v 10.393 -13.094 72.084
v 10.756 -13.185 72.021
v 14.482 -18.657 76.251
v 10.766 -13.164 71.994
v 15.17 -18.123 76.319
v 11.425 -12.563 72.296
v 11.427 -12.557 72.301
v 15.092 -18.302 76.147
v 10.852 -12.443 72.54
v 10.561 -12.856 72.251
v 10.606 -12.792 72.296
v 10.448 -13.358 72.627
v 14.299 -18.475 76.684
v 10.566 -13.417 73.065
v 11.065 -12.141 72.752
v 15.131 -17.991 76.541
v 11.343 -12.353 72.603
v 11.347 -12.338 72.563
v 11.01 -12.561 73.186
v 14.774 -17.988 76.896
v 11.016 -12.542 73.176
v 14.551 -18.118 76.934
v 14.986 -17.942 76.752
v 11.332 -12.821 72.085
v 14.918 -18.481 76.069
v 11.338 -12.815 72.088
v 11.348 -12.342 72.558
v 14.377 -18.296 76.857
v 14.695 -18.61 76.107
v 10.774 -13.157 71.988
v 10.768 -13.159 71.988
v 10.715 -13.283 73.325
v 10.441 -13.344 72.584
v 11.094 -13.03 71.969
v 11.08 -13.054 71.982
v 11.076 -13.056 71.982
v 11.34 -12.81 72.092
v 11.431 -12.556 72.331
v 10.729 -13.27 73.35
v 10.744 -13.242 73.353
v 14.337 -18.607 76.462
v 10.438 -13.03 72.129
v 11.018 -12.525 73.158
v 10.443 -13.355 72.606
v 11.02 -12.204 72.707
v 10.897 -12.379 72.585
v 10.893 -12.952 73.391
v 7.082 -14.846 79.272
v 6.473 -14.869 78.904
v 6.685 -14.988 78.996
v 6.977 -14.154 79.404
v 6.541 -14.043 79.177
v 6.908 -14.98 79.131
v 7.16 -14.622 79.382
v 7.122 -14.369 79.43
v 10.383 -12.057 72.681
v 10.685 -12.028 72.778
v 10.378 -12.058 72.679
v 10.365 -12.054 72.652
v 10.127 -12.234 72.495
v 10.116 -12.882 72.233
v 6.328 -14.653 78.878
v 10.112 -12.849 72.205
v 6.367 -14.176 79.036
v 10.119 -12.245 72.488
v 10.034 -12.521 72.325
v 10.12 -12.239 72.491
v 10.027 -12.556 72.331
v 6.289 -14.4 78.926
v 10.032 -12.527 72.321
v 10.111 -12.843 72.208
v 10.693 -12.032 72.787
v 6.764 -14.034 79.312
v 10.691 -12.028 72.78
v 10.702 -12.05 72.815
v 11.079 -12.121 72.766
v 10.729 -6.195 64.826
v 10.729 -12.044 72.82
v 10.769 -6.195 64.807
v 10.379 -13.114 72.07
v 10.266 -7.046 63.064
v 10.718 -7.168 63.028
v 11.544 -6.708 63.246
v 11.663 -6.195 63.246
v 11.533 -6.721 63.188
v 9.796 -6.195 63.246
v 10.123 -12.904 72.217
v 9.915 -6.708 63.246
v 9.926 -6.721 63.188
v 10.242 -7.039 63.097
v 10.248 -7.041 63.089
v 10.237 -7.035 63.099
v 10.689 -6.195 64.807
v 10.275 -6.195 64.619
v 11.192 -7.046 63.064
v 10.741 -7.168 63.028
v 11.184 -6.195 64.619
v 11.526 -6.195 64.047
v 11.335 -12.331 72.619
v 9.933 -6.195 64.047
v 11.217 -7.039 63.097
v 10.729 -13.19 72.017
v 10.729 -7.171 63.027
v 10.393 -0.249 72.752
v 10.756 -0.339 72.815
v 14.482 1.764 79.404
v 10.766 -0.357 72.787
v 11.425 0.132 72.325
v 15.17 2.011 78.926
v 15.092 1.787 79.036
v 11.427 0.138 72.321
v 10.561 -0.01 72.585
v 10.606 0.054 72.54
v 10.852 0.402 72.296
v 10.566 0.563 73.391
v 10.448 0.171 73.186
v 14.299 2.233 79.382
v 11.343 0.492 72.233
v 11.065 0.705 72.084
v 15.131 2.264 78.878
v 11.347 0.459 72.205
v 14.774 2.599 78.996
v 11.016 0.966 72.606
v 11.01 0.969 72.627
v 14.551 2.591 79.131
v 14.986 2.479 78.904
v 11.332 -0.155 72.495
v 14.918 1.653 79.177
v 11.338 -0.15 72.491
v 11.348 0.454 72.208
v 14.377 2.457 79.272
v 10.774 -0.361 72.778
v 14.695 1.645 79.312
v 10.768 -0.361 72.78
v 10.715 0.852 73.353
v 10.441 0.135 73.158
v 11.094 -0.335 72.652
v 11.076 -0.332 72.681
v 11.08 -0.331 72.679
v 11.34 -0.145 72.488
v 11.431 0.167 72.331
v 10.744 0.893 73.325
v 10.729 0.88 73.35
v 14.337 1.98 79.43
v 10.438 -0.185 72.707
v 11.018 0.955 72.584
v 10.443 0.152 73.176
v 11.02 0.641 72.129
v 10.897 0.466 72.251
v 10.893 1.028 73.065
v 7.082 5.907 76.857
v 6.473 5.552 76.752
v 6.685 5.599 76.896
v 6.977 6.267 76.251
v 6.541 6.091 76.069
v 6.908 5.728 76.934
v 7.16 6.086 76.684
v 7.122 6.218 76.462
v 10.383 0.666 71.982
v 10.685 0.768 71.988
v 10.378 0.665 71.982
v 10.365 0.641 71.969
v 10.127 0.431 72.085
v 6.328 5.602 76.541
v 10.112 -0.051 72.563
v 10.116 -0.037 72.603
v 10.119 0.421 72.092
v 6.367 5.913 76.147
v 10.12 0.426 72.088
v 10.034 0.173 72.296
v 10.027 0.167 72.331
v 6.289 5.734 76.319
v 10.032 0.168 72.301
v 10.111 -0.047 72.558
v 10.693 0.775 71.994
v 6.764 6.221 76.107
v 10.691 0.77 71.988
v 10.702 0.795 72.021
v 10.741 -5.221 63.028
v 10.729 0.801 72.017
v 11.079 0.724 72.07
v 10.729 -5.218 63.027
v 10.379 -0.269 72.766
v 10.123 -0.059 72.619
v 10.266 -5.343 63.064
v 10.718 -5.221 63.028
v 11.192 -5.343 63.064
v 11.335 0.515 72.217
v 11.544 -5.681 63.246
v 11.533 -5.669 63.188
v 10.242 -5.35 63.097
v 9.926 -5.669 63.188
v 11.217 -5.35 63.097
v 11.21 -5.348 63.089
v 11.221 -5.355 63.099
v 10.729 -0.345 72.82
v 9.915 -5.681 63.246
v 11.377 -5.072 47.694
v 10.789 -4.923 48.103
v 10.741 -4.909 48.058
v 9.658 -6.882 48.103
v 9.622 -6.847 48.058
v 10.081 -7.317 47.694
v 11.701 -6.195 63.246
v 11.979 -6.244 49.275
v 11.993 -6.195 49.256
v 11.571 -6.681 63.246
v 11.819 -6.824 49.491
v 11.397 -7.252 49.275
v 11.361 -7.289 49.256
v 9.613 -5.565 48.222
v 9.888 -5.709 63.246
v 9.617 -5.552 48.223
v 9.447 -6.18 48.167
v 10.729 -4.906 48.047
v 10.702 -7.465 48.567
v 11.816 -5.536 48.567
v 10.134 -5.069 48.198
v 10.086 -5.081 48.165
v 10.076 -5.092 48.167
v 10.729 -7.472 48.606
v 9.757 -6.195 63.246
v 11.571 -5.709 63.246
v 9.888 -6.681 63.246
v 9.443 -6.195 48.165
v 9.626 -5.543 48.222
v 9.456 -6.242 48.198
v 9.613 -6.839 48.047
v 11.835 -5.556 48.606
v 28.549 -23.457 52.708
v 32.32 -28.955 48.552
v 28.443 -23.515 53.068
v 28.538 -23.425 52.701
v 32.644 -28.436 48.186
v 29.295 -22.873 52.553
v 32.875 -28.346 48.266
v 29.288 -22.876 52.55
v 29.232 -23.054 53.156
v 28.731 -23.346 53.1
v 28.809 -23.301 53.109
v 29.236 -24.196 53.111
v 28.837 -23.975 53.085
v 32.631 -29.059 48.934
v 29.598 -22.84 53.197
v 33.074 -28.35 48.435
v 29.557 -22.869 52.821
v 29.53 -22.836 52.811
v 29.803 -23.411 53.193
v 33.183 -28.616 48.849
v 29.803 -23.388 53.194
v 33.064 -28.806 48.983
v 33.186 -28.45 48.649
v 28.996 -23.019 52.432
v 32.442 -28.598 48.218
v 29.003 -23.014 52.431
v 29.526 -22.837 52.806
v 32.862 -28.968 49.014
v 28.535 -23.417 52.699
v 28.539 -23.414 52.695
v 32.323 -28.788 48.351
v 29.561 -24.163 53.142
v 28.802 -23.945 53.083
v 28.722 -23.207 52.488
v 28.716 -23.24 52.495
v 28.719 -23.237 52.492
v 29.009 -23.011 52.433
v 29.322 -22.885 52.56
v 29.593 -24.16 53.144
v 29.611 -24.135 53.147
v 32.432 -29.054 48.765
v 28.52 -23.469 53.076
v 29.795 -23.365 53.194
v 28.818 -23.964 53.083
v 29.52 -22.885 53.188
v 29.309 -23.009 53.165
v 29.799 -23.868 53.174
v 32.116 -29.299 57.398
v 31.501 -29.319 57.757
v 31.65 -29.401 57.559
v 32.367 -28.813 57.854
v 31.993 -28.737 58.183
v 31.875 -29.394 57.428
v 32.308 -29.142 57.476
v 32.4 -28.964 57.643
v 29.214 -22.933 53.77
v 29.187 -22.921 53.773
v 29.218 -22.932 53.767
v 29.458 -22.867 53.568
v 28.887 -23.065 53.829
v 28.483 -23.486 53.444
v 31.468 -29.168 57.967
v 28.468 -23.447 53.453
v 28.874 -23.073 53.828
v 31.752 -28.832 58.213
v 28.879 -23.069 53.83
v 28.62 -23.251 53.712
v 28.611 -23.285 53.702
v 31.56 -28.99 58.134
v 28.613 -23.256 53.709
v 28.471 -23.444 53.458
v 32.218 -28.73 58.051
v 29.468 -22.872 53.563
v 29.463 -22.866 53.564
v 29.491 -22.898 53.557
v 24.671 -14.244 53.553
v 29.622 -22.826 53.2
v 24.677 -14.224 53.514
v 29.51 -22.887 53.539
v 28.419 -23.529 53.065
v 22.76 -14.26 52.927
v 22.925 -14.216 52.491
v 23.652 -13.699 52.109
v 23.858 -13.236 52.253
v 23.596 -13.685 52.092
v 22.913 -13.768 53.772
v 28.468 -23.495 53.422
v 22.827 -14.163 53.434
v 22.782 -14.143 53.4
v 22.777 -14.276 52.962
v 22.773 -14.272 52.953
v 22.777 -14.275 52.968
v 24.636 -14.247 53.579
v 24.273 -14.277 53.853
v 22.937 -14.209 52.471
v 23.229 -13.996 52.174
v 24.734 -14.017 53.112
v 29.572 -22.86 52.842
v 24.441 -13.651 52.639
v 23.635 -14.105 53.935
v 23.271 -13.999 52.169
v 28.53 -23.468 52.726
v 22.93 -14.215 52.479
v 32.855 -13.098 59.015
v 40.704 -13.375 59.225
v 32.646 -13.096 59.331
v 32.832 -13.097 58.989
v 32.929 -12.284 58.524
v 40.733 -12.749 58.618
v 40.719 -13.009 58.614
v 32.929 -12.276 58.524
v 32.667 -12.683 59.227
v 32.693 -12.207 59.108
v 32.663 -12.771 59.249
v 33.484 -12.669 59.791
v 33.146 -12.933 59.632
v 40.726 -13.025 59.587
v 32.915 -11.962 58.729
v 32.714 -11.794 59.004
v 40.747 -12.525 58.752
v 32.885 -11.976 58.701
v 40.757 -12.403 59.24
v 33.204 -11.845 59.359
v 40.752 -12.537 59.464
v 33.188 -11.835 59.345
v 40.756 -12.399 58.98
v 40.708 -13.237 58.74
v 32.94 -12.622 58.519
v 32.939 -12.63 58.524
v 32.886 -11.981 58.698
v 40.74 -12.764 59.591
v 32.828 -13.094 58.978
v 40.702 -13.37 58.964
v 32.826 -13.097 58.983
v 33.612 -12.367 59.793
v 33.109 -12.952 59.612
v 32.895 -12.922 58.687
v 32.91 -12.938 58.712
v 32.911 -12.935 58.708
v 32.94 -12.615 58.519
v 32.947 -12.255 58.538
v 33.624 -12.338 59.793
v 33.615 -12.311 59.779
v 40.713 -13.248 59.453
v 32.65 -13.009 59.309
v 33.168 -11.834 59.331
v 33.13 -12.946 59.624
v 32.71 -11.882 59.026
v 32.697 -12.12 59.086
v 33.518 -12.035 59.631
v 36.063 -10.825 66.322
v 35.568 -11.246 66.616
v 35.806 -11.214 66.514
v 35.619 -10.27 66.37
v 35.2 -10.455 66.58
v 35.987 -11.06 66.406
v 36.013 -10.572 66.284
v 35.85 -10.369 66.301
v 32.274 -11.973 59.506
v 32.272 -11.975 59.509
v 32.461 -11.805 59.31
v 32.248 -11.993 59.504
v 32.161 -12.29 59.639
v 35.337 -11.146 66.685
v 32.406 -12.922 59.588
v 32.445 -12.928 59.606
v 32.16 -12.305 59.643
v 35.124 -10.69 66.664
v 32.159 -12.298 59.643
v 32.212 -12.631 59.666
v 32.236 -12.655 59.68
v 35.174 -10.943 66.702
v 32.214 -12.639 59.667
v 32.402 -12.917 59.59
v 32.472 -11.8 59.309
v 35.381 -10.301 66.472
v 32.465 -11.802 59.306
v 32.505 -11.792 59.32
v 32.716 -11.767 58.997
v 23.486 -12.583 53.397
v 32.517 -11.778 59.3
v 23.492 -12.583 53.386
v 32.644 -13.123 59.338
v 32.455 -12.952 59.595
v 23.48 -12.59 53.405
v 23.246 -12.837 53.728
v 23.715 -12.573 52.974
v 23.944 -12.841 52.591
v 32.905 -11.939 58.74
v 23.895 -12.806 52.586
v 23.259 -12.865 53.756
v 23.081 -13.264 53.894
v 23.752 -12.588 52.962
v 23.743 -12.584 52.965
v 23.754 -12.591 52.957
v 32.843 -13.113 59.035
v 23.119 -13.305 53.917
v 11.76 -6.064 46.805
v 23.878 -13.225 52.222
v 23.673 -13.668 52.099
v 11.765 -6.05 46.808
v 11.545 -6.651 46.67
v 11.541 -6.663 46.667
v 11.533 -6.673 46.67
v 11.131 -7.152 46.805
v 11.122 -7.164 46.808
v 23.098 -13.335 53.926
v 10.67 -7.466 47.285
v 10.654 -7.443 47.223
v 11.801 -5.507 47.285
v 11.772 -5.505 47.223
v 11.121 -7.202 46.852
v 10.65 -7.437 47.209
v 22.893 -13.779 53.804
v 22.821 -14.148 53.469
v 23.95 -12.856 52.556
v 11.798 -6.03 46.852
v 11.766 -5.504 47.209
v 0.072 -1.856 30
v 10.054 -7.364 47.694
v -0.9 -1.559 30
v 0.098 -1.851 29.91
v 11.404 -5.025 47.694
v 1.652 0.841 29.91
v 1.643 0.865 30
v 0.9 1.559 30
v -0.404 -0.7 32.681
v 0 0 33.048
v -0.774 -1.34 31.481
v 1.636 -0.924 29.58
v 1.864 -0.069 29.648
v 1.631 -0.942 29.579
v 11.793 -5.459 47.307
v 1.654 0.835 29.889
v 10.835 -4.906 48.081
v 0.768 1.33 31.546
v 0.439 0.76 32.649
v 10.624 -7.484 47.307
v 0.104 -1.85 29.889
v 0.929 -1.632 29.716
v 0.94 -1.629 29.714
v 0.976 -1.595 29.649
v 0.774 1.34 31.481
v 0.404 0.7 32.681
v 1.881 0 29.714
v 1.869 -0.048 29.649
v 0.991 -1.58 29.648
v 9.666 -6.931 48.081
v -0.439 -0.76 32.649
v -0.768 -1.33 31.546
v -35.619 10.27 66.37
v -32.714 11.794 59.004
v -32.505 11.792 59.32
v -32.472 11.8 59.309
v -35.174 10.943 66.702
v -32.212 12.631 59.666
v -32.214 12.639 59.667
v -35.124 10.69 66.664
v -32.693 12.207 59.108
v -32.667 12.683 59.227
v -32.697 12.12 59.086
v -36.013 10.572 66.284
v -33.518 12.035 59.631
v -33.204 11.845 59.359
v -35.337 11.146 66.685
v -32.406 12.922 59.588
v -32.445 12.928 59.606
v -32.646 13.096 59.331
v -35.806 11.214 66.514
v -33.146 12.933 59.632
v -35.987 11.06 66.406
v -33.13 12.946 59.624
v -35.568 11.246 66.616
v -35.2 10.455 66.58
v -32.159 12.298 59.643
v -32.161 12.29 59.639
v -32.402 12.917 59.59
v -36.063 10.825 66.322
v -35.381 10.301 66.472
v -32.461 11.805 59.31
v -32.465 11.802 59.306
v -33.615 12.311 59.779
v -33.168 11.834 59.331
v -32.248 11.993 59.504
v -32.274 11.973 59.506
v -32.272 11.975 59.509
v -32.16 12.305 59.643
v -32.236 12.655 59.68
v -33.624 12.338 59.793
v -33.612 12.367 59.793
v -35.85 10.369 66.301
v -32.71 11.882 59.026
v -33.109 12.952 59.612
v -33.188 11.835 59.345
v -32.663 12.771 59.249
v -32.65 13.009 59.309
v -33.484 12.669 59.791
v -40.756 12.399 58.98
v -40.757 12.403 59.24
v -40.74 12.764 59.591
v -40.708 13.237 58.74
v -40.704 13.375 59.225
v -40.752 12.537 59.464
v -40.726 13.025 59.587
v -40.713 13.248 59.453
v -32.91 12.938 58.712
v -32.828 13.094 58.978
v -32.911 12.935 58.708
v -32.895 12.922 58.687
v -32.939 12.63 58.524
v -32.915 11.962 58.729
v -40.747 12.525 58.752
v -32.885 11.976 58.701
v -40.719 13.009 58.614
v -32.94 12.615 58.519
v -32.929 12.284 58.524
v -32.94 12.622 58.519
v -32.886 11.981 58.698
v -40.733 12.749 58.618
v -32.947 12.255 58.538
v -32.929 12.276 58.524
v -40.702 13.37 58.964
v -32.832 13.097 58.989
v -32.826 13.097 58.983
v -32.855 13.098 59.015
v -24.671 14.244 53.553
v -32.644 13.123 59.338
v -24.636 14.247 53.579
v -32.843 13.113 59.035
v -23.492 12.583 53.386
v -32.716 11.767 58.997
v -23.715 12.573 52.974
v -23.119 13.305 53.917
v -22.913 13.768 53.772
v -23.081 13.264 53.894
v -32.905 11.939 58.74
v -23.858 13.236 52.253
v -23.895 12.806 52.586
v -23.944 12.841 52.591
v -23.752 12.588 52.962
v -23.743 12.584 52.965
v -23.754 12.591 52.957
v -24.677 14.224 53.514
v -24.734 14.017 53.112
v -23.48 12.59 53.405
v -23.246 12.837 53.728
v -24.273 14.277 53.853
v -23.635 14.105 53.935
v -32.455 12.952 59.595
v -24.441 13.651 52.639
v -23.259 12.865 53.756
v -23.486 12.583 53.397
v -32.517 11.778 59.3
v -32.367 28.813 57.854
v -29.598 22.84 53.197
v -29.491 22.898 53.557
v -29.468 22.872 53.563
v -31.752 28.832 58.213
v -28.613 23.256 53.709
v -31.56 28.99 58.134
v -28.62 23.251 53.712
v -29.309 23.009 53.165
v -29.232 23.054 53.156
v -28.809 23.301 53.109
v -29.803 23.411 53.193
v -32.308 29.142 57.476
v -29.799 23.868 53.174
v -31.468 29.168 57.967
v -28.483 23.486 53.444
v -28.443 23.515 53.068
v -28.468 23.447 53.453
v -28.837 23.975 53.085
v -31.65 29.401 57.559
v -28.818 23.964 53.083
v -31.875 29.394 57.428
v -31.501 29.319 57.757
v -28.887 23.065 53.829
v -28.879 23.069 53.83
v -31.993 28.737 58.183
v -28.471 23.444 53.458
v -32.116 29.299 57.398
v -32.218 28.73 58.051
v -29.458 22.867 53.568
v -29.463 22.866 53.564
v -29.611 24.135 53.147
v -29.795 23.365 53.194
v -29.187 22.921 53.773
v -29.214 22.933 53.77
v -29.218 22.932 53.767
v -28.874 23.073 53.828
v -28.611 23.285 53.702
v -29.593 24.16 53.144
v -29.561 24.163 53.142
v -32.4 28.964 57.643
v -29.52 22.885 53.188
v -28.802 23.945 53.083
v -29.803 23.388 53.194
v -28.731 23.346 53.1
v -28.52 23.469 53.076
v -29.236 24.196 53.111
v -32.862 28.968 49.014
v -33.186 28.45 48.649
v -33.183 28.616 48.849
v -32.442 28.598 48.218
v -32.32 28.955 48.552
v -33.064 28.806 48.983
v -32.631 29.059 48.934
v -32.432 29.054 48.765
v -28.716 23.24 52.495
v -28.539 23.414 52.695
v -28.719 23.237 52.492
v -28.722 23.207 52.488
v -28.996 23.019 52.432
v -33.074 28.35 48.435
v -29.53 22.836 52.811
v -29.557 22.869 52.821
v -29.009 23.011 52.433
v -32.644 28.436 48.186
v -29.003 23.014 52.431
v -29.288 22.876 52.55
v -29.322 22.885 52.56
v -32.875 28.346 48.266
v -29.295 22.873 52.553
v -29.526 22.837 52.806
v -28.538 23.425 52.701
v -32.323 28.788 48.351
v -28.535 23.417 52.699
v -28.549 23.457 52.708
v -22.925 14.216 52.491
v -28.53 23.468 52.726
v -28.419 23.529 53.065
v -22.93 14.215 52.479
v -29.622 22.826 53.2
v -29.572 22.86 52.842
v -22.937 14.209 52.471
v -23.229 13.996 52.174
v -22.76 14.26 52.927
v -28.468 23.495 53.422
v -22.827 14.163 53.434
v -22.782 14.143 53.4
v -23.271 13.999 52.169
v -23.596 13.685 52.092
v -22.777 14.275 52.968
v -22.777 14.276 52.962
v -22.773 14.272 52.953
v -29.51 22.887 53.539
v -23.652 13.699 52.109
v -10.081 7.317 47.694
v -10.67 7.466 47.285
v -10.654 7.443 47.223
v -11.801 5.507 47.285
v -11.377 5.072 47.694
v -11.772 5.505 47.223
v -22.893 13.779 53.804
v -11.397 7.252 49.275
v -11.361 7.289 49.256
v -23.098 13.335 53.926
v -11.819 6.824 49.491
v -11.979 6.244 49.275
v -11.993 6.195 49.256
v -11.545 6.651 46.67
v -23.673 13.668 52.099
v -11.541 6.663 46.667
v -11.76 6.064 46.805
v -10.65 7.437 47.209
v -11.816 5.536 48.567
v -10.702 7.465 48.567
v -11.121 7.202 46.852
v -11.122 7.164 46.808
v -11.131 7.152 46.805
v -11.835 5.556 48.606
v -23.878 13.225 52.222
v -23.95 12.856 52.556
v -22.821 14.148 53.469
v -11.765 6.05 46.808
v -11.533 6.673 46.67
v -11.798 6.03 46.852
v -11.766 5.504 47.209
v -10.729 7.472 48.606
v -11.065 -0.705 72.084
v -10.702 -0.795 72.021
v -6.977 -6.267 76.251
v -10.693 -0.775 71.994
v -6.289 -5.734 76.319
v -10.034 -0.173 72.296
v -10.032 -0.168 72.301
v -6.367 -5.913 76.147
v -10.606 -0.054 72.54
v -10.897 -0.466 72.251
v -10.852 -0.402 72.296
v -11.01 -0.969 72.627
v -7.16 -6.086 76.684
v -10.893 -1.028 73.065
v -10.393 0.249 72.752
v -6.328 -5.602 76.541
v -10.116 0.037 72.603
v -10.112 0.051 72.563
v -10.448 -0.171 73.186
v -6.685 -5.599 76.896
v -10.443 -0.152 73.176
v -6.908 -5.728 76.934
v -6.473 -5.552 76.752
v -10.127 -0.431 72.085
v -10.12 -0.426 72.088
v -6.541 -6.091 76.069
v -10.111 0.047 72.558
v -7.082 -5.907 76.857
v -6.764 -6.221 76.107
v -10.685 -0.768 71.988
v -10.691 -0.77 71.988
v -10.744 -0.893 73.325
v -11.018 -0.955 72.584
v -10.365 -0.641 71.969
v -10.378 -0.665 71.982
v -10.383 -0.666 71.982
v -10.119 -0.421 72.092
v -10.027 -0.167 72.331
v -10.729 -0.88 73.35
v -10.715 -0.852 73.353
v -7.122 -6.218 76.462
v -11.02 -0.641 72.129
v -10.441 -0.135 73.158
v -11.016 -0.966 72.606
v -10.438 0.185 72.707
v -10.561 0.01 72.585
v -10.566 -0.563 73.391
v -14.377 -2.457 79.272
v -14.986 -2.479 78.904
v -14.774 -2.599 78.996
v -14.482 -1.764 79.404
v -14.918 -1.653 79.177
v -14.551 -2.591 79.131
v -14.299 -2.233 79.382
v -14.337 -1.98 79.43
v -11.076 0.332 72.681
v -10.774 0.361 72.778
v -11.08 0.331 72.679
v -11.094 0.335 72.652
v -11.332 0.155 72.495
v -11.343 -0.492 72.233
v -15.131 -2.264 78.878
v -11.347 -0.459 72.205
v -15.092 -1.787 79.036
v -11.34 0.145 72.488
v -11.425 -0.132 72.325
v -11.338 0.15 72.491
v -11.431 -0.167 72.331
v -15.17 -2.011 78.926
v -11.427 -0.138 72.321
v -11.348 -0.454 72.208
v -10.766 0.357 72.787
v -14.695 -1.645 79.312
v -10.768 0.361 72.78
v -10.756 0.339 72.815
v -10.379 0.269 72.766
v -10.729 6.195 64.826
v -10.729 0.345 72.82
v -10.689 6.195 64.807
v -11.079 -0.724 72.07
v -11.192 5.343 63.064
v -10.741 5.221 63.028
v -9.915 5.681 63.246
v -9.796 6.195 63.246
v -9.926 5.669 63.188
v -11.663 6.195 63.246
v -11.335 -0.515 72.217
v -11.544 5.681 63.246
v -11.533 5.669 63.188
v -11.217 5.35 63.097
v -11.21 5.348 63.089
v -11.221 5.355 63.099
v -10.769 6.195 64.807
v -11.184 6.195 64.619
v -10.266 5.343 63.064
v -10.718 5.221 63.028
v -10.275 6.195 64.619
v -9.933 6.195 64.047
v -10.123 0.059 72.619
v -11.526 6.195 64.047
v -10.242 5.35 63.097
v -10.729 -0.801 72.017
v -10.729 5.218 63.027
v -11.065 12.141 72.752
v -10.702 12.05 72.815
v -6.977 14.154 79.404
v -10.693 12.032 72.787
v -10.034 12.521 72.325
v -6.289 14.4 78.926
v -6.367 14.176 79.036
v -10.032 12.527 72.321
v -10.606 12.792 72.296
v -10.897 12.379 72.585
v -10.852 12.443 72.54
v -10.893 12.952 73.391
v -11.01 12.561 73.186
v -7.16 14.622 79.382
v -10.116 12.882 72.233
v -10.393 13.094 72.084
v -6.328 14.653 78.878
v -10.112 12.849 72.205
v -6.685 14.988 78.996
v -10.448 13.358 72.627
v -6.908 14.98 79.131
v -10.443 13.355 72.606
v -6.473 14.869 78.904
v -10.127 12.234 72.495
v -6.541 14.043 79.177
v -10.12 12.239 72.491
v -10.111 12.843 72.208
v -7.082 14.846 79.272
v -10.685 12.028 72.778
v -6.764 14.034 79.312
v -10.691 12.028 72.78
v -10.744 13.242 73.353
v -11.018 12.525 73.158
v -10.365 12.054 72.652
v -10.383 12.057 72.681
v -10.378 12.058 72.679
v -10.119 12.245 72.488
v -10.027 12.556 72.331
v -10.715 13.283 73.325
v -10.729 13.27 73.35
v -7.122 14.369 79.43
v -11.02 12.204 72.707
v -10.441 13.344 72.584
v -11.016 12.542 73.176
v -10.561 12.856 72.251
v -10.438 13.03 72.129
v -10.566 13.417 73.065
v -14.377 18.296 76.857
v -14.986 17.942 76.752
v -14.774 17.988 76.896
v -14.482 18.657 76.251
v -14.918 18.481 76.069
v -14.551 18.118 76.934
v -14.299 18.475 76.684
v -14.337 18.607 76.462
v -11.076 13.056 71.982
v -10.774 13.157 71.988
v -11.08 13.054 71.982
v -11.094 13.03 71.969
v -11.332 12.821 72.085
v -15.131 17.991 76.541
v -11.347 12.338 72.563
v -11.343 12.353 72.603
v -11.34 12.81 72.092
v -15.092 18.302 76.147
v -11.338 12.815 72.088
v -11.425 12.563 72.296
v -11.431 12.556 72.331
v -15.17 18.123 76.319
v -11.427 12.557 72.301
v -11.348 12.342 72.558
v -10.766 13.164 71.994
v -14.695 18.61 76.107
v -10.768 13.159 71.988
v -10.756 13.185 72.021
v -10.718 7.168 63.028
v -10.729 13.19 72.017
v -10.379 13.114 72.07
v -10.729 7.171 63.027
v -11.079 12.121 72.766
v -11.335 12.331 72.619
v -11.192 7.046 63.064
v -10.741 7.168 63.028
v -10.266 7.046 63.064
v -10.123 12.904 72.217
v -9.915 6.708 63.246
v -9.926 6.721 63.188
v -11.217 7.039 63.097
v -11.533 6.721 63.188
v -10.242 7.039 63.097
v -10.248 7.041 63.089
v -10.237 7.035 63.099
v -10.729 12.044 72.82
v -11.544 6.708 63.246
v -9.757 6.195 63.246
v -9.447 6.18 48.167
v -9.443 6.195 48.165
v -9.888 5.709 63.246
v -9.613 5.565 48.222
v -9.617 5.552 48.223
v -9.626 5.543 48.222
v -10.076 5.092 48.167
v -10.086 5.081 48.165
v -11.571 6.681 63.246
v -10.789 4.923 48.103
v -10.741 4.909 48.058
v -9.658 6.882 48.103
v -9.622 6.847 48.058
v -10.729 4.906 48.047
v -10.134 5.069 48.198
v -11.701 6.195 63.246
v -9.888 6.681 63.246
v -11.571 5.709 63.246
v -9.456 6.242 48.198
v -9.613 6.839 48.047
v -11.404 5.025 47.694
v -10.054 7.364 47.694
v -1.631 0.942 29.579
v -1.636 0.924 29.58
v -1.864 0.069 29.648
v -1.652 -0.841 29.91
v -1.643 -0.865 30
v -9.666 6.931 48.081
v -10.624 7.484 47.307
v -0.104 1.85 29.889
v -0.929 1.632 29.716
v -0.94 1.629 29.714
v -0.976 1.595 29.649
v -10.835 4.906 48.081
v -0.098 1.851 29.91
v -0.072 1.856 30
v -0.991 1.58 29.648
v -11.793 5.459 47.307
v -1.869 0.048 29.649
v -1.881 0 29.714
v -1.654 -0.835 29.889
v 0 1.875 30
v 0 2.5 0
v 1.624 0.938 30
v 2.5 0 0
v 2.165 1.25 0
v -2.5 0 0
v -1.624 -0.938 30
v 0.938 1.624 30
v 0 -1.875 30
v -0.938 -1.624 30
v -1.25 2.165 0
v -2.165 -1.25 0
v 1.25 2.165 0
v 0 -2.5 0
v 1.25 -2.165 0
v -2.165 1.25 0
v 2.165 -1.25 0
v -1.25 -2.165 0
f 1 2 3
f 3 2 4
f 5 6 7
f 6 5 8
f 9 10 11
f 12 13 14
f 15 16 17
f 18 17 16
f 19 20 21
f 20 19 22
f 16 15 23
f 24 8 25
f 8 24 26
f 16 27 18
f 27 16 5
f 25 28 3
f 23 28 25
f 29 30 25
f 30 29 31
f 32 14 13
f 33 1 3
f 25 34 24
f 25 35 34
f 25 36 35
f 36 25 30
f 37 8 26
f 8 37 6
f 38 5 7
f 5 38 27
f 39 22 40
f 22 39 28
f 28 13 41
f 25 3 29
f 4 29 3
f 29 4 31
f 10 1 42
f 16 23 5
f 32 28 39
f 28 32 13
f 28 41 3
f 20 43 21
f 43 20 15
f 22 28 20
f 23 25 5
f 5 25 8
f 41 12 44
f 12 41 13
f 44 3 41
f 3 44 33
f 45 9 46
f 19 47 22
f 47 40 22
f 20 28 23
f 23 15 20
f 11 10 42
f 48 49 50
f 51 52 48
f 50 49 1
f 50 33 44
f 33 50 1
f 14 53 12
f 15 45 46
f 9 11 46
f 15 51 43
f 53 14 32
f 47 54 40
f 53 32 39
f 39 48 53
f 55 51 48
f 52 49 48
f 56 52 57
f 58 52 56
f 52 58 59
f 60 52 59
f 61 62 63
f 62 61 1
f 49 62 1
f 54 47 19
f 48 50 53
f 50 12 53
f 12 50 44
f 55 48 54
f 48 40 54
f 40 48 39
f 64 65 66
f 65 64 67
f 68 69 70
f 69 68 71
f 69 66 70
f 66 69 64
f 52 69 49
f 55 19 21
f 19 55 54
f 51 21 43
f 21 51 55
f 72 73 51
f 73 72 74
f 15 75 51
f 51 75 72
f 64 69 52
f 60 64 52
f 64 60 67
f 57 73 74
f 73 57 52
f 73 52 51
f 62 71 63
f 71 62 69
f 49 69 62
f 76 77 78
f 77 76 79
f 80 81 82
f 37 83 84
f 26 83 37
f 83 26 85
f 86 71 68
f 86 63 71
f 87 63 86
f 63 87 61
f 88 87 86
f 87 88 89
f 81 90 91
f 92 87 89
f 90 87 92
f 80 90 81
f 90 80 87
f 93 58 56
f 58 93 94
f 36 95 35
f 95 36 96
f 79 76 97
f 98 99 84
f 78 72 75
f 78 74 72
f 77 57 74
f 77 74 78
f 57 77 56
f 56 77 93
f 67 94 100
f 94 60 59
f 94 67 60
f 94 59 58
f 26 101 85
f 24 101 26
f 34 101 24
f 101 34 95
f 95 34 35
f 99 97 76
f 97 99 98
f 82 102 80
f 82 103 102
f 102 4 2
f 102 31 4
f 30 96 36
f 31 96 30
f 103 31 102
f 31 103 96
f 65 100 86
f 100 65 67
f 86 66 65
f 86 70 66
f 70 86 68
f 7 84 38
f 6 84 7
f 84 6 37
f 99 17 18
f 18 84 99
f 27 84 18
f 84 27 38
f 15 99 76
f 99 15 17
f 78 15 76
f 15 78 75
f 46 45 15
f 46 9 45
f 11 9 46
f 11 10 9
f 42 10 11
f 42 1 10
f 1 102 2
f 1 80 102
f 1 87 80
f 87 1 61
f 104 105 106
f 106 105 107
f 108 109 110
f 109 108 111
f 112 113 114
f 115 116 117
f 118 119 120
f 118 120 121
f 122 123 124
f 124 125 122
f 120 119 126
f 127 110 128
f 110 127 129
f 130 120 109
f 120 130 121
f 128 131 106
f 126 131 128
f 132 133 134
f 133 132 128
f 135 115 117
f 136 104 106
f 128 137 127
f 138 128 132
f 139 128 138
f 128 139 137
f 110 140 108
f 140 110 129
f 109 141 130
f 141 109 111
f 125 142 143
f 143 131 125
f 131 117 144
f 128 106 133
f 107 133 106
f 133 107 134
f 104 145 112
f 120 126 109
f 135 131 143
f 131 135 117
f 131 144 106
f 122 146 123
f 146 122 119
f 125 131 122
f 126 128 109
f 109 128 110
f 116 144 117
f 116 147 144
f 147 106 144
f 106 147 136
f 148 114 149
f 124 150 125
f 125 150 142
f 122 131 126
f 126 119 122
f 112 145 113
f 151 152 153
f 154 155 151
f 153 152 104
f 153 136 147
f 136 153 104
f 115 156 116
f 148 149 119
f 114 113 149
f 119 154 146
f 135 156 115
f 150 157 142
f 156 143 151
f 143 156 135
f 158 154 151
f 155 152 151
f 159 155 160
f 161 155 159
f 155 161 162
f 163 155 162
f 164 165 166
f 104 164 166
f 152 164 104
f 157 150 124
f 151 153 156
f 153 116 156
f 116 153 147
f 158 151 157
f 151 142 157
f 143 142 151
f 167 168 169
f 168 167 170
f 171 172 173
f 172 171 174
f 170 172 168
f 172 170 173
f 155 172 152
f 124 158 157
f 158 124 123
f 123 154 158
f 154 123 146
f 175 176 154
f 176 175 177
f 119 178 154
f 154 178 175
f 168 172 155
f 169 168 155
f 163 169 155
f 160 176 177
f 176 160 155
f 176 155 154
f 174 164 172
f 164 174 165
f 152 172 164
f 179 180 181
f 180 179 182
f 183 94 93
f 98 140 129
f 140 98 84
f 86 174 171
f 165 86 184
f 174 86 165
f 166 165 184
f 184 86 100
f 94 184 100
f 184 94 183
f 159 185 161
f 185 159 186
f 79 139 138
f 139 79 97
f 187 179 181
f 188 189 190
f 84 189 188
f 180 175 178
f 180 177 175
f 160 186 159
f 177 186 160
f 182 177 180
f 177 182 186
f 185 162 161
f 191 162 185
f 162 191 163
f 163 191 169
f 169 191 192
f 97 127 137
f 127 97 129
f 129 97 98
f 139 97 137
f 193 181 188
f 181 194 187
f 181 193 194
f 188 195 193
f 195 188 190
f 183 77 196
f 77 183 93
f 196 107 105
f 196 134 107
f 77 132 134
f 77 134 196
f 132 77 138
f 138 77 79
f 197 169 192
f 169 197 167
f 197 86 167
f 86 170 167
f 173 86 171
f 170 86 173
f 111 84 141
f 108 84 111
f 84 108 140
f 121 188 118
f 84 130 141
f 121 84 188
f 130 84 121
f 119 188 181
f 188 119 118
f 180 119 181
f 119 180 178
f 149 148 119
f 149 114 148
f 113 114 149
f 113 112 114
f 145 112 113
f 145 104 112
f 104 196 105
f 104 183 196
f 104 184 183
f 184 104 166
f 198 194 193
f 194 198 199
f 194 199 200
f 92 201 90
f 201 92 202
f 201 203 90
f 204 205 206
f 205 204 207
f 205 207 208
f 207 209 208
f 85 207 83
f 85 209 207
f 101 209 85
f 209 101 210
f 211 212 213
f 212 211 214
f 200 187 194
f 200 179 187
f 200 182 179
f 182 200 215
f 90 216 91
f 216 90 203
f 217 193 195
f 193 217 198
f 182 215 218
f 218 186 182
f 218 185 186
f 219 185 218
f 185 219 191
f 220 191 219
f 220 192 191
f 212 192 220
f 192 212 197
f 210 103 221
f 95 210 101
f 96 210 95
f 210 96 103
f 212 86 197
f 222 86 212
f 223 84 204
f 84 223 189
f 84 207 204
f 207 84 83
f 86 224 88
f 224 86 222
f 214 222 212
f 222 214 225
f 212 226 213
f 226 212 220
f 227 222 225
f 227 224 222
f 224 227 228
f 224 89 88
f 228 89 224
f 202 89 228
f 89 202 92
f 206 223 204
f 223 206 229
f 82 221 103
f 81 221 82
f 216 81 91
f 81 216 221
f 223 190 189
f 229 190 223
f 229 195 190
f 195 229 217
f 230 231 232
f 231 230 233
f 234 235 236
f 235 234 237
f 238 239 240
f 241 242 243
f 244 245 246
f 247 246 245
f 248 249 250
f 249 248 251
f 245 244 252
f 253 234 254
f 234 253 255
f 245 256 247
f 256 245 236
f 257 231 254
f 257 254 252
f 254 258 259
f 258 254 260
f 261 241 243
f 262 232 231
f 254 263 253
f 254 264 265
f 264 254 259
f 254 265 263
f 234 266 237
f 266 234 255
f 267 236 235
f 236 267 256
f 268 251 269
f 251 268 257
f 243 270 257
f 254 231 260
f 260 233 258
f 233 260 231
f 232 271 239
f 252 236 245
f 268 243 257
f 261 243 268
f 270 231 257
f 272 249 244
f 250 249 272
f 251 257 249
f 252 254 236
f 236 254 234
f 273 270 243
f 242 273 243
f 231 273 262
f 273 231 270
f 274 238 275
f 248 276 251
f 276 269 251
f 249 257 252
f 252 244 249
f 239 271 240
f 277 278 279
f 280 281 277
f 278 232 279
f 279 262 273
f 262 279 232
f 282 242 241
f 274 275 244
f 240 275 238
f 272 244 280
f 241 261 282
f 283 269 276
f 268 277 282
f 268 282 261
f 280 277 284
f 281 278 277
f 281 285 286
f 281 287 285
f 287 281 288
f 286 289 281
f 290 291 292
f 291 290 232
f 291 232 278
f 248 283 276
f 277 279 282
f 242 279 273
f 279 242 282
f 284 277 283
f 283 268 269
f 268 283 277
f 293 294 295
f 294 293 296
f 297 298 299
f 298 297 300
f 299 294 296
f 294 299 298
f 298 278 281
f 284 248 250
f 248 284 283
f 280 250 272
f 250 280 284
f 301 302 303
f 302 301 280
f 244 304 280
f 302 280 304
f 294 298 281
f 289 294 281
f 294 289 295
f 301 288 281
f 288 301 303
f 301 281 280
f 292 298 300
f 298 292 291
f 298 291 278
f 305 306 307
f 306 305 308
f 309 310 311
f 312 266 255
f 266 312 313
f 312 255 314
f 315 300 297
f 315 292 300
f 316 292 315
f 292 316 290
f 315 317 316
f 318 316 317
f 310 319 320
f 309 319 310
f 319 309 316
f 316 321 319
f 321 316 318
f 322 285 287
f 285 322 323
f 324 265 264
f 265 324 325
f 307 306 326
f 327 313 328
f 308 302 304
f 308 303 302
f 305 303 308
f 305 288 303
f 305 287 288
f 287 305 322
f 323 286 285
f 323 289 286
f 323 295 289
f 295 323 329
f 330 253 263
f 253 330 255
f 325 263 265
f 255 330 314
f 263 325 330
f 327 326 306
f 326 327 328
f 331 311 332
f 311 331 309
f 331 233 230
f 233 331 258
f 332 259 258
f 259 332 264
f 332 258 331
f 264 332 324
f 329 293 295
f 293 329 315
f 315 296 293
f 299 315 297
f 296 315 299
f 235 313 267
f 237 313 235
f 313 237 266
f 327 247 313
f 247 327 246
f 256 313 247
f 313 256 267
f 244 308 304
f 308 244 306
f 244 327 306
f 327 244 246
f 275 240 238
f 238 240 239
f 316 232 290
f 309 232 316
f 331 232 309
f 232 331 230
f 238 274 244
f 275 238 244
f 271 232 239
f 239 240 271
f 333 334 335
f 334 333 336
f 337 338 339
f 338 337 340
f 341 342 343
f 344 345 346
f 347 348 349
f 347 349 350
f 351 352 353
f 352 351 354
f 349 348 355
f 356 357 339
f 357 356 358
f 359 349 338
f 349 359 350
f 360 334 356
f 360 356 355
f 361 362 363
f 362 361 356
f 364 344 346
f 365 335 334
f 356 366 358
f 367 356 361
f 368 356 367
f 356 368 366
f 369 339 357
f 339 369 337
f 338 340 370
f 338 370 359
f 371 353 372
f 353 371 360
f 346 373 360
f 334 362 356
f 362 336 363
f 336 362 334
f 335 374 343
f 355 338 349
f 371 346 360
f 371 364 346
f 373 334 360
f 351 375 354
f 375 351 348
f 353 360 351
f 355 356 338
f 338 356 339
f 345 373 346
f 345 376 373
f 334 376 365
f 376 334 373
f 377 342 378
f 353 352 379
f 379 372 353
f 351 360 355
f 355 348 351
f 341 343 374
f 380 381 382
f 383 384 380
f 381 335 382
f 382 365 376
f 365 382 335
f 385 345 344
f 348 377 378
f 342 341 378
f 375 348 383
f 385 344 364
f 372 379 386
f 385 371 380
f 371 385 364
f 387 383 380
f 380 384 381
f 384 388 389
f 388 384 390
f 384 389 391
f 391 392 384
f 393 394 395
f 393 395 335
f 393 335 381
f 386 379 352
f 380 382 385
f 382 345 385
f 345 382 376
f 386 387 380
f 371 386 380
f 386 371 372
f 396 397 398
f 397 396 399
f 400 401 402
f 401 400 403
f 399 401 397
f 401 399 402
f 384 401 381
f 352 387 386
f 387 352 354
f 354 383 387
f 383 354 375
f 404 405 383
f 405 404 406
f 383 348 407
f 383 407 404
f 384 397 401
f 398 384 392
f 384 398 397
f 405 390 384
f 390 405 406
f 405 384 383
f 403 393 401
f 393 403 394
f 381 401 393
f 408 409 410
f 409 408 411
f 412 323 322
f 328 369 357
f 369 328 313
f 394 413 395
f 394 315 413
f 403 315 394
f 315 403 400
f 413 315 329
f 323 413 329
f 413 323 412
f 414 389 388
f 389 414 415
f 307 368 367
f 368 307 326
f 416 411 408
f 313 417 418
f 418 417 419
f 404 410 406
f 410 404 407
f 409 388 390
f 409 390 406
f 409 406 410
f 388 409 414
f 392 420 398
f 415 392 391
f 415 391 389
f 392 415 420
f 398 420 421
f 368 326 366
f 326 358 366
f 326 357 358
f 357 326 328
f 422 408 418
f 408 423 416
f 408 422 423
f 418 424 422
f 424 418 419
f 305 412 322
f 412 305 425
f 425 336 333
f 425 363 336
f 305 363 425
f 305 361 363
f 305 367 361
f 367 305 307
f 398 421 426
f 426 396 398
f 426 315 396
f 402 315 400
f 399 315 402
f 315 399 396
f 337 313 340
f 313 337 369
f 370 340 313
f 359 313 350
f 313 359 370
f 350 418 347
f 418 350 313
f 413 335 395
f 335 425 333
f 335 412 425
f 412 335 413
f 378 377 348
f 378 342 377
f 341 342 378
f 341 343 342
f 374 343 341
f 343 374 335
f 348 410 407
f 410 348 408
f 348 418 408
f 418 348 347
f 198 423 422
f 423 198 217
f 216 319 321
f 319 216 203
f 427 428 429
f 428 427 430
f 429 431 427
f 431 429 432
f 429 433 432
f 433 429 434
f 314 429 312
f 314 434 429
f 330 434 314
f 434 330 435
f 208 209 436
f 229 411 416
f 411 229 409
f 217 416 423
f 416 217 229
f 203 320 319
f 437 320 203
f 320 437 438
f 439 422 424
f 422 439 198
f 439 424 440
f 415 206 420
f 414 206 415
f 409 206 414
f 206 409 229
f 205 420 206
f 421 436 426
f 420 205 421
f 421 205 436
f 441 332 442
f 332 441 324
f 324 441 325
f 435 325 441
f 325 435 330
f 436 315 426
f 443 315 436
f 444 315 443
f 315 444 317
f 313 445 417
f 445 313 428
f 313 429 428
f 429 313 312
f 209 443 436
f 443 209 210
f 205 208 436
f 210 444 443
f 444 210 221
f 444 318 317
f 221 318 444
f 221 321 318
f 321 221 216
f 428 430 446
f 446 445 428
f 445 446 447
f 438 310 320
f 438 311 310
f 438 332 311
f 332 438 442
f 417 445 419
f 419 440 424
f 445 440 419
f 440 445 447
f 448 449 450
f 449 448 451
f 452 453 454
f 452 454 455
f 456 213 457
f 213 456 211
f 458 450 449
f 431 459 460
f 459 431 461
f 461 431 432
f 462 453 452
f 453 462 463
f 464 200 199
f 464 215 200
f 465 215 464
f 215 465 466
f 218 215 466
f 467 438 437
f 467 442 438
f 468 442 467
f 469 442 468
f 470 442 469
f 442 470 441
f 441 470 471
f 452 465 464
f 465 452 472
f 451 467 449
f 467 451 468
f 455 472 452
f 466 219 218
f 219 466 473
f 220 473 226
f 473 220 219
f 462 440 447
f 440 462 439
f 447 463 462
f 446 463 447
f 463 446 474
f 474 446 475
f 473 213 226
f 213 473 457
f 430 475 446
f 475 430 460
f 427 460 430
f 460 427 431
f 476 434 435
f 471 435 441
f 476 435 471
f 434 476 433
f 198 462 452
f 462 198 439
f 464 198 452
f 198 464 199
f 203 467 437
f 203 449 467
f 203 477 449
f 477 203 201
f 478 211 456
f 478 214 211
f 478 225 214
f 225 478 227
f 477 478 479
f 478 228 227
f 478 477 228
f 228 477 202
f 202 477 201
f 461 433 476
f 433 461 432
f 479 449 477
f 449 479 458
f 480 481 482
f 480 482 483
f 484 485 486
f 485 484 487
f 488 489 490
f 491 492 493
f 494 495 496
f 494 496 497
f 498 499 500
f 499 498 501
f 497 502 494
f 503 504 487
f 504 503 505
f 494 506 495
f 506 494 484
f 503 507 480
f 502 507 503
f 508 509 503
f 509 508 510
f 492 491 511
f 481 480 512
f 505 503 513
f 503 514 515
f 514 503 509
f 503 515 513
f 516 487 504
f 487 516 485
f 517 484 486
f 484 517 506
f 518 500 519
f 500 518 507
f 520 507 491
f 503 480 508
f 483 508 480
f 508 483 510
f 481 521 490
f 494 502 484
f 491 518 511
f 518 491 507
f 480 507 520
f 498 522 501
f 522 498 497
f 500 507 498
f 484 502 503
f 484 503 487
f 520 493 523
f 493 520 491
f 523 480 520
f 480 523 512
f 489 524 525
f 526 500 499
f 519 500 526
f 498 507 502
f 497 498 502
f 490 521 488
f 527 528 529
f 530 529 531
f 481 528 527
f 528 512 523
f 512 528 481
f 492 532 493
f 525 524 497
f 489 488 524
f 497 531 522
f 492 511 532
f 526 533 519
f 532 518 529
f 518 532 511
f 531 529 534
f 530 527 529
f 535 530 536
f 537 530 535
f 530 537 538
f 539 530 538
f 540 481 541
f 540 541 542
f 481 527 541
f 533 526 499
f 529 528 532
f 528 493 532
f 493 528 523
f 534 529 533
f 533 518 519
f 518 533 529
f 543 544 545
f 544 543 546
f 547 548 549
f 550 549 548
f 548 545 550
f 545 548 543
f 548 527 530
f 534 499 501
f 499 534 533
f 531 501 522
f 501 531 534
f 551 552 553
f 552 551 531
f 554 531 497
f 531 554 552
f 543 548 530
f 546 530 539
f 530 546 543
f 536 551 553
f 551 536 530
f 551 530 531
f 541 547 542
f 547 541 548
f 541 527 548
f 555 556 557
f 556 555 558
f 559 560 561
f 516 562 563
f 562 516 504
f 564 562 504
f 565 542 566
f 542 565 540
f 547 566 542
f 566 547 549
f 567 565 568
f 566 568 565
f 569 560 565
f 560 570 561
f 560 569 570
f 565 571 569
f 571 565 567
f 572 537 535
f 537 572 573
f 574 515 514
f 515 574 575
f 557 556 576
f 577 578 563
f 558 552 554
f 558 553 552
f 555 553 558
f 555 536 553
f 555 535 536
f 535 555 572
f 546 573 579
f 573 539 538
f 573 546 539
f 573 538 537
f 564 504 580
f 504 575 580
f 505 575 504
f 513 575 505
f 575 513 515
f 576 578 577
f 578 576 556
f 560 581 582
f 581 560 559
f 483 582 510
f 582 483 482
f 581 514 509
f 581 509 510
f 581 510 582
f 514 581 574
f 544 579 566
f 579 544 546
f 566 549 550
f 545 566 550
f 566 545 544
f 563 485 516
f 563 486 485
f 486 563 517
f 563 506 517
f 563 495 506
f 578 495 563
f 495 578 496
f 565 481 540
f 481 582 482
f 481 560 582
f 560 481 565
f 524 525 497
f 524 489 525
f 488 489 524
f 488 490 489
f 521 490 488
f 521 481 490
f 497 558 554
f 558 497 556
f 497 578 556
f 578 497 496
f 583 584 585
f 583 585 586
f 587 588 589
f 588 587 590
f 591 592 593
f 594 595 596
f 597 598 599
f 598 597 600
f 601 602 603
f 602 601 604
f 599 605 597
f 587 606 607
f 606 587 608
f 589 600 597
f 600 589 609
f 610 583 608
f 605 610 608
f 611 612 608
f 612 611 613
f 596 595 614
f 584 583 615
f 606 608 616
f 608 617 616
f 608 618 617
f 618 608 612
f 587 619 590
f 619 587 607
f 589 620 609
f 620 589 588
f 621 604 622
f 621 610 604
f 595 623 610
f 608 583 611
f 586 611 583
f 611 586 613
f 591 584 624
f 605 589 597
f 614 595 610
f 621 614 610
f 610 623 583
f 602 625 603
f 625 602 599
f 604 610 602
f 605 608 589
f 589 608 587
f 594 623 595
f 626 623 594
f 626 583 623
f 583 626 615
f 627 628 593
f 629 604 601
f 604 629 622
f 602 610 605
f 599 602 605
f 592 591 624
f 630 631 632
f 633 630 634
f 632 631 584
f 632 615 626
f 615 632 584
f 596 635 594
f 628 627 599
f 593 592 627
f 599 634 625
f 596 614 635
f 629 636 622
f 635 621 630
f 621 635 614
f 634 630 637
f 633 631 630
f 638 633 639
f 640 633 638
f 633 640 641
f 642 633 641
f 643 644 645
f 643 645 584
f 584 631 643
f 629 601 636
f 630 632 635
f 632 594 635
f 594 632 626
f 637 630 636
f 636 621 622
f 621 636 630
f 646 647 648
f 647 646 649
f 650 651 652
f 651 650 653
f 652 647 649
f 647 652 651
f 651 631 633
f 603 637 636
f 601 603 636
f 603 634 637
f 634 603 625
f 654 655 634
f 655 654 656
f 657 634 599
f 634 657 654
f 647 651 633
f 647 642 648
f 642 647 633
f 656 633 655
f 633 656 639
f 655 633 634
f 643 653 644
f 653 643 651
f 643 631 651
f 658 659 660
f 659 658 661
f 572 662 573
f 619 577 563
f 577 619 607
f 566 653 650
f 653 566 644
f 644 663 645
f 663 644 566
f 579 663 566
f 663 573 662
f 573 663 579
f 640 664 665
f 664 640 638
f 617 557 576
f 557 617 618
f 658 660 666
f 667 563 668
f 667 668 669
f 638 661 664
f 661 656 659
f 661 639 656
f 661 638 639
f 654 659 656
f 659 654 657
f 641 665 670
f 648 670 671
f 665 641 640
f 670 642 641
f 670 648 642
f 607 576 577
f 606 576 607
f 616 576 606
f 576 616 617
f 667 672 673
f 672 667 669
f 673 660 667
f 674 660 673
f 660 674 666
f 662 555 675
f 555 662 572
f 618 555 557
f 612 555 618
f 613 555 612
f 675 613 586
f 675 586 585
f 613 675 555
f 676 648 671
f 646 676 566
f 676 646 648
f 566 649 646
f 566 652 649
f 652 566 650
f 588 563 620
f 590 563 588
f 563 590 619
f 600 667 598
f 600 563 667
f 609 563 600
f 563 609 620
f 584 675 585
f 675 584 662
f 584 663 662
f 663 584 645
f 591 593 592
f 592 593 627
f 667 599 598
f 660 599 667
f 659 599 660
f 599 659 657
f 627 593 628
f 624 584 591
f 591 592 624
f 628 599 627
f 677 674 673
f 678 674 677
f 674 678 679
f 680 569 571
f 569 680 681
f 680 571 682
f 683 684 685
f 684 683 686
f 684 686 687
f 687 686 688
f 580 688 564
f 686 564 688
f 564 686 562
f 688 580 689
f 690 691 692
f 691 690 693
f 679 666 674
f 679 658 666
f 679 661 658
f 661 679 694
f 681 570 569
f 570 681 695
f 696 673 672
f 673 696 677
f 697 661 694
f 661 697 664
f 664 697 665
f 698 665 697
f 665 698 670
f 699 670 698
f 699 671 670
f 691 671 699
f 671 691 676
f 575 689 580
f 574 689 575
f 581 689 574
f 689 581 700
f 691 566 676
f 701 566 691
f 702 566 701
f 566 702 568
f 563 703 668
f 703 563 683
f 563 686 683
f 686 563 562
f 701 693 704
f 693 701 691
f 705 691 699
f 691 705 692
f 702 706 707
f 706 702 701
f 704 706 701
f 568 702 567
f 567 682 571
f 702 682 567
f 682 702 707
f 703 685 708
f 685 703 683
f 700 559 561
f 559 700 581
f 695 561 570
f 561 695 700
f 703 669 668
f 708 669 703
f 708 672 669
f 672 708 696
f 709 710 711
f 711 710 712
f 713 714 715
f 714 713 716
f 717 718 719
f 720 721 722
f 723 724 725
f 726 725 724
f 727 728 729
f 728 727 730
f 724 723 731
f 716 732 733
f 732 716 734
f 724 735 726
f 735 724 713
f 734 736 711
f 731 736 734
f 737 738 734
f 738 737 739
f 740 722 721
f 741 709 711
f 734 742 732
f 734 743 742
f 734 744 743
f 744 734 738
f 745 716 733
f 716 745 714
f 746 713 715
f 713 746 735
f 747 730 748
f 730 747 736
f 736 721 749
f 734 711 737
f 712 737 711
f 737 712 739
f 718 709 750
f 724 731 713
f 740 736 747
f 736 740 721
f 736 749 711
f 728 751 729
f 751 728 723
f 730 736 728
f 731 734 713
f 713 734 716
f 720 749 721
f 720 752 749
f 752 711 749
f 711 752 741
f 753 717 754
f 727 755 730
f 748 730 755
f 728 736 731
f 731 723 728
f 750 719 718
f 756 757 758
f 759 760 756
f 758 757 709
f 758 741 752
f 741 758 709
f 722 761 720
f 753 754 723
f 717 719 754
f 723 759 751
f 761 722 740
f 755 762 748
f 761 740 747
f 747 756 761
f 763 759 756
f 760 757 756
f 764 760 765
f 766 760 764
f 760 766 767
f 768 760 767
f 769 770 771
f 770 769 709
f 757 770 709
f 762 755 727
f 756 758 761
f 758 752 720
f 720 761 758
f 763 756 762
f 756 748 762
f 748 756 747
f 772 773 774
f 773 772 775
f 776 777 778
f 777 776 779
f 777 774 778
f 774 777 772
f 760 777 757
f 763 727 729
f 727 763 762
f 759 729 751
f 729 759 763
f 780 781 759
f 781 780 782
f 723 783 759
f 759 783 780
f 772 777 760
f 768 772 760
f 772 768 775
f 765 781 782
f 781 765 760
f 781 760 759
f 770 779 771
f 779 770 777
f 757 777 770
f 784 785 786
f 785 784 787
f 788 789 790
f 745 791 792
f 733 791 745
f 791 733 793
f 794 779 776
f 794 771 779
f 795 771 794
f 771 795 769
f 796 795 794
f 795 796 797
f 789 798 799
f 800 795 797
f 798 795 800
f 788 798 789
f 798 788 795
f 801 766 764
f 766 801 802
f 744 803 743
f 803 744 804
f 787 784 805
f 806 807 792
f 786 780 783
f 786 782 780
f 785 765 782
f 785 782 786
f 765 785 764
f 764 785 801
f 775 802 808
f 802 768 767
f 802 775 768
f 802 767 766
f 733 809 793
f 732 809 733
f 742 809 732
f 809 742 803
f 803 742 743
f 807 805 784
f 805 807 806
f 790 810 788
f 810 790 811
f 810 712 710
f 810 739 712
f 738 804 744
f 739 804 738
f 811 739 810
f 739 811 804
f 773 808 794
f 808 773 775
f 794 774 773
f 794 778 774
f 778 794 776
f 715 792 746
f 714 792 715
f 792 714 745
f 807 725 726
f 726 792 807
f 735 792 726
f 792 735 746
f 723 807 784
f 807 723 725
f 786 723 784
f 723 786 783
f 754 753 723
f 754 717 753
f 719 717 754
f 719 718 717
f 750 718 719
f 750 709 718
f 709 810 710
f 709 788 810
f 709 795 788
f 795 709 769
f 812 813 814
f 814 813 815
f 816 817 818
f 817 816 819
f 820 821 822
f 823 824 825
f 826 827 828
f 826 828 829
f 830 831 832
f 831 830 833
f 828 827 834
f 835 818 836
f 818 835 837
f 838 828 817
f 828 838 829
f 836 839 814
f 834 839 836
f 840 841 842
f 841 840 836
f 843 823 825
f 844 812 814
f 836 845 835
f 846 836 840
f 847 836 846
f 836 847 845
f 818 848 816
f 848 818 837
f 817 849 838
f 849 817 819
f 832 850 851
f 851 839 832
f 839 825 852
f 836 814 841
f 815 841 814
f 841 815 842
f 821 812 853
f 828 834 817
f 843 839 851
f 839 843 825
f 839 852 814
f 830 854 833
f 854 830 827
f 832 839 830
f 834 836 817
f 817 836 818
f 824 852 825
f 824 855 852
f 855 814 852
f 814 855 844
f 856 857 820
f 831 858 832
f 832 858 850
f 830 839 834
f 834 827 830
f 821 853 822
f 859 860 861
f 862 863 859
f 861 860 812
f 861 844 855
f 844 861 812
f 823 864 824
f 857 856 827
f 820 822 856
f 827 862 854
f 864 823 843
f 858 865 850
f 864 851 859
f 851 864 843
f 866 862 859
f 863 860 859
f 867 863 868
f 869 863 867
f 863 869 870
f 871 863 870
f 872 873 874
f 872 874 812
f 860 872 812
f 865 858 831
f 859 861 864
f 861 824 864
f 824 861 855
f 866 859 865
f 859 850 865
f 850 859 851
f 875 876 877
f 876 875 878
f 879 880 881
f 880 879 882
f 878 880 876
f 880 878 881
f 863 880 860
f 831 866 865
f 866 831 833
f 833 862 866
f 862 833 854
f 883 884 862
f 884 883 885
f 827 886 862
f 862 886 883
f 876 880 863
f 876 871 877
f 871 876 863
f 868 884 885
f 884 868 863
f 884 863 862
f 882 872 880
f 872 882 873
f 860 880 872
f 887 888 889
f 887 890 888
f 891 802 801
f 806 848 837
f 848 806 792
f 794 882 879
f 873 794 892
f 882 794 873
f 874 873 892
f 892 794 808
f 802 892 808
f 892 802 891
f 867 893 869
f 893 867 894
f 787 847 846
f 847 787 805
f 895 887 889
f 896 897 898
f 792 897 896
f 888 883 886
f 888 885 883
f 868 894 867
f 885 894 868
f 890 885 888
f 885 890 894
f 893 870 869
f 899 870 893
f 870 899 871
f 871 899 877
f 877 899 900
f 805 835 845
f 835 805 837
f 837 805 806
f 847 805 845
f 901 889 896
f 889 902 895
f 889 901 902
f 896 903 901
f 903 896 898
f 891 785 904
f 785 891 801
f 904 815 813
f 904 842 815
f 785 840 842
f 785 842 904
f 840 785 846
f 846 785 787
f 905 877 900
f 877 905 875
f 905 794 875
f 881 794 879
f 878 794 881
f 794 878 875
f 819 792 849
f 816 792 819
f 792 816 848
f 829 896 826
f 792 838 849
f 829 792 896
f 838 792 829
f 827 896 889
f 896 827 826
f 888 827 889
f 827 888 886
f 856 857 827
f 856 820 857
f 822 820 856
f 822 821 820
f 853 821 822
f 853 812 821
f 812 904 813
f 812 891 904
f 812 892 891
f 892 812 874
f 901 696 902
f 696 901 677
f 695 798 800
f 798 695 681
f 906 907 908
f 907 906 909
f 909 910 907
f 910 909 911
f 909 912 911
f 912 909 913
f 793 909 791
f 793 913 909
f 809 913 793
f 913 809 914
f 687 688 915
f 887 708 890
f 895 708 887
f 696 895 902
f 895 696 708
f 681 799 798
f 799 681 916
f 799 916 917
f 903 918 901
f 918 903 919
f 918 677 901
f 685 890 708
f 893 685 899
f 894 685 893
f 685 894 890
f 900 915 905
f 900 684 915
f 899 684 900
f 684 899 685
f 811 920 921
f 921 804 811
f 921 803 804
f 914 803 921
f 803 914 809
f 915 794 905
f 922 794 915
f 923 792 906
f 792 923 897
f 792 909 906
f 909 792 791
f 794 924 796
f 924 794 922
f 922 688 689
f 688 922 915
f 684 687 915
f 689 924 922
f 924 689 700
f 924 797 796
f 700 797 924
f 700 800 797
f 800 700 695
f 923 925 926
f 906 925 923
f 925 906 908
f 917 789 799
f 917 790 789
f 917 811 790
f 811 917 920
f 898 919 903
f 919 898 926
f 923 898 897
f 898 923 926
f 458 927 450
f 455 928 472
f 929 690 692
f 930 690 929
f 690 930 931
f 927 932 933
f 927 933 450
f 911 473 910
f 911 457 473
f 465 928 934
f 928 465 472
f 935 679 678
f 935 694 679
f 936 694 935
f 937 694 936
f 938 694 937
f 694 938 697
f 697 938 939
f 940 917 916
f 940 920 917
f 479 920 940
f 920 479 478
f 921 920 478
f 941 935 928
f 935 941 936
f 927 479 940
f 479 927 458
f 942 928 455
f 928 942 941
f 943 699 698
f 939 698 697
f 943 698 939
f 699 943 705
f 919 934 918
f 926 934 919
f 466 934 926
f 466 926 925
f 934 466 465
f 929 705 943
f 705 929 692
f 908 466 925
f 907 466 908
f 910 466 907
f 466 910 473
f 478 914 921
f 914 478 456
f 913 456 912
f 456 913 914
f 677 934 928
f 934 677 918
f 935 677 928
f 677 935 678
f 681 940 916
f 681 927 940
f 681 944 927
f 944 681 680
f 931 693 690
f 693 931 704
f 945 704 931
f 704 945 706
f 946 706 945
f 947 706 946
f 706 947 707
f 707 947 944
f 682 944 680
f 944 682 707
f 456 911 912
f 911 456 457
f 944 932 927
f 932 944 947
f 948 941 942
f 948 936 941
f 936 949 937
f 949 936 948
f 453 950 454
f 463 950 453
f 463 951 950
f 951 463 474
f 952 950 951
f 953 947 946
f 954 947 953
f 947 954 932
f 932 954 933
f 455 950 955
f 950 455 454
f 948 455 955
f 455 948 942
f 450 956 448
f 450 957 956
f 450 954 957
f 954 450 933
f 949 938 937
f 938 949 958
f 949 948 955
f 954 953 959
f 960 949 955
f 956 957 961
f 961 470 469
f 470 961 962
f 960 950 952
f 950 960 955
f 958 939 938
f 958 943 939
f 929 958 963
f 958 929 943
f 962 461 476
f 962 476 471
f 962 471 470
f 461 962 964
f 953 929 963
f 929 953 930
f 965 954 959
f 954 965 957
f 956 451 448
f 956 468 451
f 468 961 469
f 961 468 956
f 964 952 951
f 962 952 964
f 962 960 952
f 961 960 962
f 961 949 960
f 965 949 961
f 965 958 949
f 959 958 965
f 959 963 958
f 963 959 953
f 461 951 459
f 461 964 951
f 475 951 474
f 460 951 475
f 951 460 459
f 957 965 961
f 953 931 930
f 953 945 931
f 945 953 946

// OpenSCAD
// Recursion, the only kind of loop a function has.
//
// Each call must reduce the problem, and every branch must return -- a
// function that falls off the end yields undef.

function factorial(n) = n <= 1 ? 1 : n * factorial(n - 1);
echo(str("10! = ", factorial(10)));

function sum(v, i=0) = i >= len(v) ? 0 : v[i] + sum(v, i + 1);
echo(str("sum = ", sum([1, 2, 3, 4, 5])));

// A module can recurse too, and that is how you build a tree.
module branch(len, depth) {
    cylinder(h=len, r1=len/12, r2=len/16, $fn=12);
    if (depth > 0)
        translate([0, 0, len])
            for (a = [-35, 35])
                rotate([a, 0, depth * 60])
                    branch(len * 0.72, depth - 1);
}

branch(30, 4);
